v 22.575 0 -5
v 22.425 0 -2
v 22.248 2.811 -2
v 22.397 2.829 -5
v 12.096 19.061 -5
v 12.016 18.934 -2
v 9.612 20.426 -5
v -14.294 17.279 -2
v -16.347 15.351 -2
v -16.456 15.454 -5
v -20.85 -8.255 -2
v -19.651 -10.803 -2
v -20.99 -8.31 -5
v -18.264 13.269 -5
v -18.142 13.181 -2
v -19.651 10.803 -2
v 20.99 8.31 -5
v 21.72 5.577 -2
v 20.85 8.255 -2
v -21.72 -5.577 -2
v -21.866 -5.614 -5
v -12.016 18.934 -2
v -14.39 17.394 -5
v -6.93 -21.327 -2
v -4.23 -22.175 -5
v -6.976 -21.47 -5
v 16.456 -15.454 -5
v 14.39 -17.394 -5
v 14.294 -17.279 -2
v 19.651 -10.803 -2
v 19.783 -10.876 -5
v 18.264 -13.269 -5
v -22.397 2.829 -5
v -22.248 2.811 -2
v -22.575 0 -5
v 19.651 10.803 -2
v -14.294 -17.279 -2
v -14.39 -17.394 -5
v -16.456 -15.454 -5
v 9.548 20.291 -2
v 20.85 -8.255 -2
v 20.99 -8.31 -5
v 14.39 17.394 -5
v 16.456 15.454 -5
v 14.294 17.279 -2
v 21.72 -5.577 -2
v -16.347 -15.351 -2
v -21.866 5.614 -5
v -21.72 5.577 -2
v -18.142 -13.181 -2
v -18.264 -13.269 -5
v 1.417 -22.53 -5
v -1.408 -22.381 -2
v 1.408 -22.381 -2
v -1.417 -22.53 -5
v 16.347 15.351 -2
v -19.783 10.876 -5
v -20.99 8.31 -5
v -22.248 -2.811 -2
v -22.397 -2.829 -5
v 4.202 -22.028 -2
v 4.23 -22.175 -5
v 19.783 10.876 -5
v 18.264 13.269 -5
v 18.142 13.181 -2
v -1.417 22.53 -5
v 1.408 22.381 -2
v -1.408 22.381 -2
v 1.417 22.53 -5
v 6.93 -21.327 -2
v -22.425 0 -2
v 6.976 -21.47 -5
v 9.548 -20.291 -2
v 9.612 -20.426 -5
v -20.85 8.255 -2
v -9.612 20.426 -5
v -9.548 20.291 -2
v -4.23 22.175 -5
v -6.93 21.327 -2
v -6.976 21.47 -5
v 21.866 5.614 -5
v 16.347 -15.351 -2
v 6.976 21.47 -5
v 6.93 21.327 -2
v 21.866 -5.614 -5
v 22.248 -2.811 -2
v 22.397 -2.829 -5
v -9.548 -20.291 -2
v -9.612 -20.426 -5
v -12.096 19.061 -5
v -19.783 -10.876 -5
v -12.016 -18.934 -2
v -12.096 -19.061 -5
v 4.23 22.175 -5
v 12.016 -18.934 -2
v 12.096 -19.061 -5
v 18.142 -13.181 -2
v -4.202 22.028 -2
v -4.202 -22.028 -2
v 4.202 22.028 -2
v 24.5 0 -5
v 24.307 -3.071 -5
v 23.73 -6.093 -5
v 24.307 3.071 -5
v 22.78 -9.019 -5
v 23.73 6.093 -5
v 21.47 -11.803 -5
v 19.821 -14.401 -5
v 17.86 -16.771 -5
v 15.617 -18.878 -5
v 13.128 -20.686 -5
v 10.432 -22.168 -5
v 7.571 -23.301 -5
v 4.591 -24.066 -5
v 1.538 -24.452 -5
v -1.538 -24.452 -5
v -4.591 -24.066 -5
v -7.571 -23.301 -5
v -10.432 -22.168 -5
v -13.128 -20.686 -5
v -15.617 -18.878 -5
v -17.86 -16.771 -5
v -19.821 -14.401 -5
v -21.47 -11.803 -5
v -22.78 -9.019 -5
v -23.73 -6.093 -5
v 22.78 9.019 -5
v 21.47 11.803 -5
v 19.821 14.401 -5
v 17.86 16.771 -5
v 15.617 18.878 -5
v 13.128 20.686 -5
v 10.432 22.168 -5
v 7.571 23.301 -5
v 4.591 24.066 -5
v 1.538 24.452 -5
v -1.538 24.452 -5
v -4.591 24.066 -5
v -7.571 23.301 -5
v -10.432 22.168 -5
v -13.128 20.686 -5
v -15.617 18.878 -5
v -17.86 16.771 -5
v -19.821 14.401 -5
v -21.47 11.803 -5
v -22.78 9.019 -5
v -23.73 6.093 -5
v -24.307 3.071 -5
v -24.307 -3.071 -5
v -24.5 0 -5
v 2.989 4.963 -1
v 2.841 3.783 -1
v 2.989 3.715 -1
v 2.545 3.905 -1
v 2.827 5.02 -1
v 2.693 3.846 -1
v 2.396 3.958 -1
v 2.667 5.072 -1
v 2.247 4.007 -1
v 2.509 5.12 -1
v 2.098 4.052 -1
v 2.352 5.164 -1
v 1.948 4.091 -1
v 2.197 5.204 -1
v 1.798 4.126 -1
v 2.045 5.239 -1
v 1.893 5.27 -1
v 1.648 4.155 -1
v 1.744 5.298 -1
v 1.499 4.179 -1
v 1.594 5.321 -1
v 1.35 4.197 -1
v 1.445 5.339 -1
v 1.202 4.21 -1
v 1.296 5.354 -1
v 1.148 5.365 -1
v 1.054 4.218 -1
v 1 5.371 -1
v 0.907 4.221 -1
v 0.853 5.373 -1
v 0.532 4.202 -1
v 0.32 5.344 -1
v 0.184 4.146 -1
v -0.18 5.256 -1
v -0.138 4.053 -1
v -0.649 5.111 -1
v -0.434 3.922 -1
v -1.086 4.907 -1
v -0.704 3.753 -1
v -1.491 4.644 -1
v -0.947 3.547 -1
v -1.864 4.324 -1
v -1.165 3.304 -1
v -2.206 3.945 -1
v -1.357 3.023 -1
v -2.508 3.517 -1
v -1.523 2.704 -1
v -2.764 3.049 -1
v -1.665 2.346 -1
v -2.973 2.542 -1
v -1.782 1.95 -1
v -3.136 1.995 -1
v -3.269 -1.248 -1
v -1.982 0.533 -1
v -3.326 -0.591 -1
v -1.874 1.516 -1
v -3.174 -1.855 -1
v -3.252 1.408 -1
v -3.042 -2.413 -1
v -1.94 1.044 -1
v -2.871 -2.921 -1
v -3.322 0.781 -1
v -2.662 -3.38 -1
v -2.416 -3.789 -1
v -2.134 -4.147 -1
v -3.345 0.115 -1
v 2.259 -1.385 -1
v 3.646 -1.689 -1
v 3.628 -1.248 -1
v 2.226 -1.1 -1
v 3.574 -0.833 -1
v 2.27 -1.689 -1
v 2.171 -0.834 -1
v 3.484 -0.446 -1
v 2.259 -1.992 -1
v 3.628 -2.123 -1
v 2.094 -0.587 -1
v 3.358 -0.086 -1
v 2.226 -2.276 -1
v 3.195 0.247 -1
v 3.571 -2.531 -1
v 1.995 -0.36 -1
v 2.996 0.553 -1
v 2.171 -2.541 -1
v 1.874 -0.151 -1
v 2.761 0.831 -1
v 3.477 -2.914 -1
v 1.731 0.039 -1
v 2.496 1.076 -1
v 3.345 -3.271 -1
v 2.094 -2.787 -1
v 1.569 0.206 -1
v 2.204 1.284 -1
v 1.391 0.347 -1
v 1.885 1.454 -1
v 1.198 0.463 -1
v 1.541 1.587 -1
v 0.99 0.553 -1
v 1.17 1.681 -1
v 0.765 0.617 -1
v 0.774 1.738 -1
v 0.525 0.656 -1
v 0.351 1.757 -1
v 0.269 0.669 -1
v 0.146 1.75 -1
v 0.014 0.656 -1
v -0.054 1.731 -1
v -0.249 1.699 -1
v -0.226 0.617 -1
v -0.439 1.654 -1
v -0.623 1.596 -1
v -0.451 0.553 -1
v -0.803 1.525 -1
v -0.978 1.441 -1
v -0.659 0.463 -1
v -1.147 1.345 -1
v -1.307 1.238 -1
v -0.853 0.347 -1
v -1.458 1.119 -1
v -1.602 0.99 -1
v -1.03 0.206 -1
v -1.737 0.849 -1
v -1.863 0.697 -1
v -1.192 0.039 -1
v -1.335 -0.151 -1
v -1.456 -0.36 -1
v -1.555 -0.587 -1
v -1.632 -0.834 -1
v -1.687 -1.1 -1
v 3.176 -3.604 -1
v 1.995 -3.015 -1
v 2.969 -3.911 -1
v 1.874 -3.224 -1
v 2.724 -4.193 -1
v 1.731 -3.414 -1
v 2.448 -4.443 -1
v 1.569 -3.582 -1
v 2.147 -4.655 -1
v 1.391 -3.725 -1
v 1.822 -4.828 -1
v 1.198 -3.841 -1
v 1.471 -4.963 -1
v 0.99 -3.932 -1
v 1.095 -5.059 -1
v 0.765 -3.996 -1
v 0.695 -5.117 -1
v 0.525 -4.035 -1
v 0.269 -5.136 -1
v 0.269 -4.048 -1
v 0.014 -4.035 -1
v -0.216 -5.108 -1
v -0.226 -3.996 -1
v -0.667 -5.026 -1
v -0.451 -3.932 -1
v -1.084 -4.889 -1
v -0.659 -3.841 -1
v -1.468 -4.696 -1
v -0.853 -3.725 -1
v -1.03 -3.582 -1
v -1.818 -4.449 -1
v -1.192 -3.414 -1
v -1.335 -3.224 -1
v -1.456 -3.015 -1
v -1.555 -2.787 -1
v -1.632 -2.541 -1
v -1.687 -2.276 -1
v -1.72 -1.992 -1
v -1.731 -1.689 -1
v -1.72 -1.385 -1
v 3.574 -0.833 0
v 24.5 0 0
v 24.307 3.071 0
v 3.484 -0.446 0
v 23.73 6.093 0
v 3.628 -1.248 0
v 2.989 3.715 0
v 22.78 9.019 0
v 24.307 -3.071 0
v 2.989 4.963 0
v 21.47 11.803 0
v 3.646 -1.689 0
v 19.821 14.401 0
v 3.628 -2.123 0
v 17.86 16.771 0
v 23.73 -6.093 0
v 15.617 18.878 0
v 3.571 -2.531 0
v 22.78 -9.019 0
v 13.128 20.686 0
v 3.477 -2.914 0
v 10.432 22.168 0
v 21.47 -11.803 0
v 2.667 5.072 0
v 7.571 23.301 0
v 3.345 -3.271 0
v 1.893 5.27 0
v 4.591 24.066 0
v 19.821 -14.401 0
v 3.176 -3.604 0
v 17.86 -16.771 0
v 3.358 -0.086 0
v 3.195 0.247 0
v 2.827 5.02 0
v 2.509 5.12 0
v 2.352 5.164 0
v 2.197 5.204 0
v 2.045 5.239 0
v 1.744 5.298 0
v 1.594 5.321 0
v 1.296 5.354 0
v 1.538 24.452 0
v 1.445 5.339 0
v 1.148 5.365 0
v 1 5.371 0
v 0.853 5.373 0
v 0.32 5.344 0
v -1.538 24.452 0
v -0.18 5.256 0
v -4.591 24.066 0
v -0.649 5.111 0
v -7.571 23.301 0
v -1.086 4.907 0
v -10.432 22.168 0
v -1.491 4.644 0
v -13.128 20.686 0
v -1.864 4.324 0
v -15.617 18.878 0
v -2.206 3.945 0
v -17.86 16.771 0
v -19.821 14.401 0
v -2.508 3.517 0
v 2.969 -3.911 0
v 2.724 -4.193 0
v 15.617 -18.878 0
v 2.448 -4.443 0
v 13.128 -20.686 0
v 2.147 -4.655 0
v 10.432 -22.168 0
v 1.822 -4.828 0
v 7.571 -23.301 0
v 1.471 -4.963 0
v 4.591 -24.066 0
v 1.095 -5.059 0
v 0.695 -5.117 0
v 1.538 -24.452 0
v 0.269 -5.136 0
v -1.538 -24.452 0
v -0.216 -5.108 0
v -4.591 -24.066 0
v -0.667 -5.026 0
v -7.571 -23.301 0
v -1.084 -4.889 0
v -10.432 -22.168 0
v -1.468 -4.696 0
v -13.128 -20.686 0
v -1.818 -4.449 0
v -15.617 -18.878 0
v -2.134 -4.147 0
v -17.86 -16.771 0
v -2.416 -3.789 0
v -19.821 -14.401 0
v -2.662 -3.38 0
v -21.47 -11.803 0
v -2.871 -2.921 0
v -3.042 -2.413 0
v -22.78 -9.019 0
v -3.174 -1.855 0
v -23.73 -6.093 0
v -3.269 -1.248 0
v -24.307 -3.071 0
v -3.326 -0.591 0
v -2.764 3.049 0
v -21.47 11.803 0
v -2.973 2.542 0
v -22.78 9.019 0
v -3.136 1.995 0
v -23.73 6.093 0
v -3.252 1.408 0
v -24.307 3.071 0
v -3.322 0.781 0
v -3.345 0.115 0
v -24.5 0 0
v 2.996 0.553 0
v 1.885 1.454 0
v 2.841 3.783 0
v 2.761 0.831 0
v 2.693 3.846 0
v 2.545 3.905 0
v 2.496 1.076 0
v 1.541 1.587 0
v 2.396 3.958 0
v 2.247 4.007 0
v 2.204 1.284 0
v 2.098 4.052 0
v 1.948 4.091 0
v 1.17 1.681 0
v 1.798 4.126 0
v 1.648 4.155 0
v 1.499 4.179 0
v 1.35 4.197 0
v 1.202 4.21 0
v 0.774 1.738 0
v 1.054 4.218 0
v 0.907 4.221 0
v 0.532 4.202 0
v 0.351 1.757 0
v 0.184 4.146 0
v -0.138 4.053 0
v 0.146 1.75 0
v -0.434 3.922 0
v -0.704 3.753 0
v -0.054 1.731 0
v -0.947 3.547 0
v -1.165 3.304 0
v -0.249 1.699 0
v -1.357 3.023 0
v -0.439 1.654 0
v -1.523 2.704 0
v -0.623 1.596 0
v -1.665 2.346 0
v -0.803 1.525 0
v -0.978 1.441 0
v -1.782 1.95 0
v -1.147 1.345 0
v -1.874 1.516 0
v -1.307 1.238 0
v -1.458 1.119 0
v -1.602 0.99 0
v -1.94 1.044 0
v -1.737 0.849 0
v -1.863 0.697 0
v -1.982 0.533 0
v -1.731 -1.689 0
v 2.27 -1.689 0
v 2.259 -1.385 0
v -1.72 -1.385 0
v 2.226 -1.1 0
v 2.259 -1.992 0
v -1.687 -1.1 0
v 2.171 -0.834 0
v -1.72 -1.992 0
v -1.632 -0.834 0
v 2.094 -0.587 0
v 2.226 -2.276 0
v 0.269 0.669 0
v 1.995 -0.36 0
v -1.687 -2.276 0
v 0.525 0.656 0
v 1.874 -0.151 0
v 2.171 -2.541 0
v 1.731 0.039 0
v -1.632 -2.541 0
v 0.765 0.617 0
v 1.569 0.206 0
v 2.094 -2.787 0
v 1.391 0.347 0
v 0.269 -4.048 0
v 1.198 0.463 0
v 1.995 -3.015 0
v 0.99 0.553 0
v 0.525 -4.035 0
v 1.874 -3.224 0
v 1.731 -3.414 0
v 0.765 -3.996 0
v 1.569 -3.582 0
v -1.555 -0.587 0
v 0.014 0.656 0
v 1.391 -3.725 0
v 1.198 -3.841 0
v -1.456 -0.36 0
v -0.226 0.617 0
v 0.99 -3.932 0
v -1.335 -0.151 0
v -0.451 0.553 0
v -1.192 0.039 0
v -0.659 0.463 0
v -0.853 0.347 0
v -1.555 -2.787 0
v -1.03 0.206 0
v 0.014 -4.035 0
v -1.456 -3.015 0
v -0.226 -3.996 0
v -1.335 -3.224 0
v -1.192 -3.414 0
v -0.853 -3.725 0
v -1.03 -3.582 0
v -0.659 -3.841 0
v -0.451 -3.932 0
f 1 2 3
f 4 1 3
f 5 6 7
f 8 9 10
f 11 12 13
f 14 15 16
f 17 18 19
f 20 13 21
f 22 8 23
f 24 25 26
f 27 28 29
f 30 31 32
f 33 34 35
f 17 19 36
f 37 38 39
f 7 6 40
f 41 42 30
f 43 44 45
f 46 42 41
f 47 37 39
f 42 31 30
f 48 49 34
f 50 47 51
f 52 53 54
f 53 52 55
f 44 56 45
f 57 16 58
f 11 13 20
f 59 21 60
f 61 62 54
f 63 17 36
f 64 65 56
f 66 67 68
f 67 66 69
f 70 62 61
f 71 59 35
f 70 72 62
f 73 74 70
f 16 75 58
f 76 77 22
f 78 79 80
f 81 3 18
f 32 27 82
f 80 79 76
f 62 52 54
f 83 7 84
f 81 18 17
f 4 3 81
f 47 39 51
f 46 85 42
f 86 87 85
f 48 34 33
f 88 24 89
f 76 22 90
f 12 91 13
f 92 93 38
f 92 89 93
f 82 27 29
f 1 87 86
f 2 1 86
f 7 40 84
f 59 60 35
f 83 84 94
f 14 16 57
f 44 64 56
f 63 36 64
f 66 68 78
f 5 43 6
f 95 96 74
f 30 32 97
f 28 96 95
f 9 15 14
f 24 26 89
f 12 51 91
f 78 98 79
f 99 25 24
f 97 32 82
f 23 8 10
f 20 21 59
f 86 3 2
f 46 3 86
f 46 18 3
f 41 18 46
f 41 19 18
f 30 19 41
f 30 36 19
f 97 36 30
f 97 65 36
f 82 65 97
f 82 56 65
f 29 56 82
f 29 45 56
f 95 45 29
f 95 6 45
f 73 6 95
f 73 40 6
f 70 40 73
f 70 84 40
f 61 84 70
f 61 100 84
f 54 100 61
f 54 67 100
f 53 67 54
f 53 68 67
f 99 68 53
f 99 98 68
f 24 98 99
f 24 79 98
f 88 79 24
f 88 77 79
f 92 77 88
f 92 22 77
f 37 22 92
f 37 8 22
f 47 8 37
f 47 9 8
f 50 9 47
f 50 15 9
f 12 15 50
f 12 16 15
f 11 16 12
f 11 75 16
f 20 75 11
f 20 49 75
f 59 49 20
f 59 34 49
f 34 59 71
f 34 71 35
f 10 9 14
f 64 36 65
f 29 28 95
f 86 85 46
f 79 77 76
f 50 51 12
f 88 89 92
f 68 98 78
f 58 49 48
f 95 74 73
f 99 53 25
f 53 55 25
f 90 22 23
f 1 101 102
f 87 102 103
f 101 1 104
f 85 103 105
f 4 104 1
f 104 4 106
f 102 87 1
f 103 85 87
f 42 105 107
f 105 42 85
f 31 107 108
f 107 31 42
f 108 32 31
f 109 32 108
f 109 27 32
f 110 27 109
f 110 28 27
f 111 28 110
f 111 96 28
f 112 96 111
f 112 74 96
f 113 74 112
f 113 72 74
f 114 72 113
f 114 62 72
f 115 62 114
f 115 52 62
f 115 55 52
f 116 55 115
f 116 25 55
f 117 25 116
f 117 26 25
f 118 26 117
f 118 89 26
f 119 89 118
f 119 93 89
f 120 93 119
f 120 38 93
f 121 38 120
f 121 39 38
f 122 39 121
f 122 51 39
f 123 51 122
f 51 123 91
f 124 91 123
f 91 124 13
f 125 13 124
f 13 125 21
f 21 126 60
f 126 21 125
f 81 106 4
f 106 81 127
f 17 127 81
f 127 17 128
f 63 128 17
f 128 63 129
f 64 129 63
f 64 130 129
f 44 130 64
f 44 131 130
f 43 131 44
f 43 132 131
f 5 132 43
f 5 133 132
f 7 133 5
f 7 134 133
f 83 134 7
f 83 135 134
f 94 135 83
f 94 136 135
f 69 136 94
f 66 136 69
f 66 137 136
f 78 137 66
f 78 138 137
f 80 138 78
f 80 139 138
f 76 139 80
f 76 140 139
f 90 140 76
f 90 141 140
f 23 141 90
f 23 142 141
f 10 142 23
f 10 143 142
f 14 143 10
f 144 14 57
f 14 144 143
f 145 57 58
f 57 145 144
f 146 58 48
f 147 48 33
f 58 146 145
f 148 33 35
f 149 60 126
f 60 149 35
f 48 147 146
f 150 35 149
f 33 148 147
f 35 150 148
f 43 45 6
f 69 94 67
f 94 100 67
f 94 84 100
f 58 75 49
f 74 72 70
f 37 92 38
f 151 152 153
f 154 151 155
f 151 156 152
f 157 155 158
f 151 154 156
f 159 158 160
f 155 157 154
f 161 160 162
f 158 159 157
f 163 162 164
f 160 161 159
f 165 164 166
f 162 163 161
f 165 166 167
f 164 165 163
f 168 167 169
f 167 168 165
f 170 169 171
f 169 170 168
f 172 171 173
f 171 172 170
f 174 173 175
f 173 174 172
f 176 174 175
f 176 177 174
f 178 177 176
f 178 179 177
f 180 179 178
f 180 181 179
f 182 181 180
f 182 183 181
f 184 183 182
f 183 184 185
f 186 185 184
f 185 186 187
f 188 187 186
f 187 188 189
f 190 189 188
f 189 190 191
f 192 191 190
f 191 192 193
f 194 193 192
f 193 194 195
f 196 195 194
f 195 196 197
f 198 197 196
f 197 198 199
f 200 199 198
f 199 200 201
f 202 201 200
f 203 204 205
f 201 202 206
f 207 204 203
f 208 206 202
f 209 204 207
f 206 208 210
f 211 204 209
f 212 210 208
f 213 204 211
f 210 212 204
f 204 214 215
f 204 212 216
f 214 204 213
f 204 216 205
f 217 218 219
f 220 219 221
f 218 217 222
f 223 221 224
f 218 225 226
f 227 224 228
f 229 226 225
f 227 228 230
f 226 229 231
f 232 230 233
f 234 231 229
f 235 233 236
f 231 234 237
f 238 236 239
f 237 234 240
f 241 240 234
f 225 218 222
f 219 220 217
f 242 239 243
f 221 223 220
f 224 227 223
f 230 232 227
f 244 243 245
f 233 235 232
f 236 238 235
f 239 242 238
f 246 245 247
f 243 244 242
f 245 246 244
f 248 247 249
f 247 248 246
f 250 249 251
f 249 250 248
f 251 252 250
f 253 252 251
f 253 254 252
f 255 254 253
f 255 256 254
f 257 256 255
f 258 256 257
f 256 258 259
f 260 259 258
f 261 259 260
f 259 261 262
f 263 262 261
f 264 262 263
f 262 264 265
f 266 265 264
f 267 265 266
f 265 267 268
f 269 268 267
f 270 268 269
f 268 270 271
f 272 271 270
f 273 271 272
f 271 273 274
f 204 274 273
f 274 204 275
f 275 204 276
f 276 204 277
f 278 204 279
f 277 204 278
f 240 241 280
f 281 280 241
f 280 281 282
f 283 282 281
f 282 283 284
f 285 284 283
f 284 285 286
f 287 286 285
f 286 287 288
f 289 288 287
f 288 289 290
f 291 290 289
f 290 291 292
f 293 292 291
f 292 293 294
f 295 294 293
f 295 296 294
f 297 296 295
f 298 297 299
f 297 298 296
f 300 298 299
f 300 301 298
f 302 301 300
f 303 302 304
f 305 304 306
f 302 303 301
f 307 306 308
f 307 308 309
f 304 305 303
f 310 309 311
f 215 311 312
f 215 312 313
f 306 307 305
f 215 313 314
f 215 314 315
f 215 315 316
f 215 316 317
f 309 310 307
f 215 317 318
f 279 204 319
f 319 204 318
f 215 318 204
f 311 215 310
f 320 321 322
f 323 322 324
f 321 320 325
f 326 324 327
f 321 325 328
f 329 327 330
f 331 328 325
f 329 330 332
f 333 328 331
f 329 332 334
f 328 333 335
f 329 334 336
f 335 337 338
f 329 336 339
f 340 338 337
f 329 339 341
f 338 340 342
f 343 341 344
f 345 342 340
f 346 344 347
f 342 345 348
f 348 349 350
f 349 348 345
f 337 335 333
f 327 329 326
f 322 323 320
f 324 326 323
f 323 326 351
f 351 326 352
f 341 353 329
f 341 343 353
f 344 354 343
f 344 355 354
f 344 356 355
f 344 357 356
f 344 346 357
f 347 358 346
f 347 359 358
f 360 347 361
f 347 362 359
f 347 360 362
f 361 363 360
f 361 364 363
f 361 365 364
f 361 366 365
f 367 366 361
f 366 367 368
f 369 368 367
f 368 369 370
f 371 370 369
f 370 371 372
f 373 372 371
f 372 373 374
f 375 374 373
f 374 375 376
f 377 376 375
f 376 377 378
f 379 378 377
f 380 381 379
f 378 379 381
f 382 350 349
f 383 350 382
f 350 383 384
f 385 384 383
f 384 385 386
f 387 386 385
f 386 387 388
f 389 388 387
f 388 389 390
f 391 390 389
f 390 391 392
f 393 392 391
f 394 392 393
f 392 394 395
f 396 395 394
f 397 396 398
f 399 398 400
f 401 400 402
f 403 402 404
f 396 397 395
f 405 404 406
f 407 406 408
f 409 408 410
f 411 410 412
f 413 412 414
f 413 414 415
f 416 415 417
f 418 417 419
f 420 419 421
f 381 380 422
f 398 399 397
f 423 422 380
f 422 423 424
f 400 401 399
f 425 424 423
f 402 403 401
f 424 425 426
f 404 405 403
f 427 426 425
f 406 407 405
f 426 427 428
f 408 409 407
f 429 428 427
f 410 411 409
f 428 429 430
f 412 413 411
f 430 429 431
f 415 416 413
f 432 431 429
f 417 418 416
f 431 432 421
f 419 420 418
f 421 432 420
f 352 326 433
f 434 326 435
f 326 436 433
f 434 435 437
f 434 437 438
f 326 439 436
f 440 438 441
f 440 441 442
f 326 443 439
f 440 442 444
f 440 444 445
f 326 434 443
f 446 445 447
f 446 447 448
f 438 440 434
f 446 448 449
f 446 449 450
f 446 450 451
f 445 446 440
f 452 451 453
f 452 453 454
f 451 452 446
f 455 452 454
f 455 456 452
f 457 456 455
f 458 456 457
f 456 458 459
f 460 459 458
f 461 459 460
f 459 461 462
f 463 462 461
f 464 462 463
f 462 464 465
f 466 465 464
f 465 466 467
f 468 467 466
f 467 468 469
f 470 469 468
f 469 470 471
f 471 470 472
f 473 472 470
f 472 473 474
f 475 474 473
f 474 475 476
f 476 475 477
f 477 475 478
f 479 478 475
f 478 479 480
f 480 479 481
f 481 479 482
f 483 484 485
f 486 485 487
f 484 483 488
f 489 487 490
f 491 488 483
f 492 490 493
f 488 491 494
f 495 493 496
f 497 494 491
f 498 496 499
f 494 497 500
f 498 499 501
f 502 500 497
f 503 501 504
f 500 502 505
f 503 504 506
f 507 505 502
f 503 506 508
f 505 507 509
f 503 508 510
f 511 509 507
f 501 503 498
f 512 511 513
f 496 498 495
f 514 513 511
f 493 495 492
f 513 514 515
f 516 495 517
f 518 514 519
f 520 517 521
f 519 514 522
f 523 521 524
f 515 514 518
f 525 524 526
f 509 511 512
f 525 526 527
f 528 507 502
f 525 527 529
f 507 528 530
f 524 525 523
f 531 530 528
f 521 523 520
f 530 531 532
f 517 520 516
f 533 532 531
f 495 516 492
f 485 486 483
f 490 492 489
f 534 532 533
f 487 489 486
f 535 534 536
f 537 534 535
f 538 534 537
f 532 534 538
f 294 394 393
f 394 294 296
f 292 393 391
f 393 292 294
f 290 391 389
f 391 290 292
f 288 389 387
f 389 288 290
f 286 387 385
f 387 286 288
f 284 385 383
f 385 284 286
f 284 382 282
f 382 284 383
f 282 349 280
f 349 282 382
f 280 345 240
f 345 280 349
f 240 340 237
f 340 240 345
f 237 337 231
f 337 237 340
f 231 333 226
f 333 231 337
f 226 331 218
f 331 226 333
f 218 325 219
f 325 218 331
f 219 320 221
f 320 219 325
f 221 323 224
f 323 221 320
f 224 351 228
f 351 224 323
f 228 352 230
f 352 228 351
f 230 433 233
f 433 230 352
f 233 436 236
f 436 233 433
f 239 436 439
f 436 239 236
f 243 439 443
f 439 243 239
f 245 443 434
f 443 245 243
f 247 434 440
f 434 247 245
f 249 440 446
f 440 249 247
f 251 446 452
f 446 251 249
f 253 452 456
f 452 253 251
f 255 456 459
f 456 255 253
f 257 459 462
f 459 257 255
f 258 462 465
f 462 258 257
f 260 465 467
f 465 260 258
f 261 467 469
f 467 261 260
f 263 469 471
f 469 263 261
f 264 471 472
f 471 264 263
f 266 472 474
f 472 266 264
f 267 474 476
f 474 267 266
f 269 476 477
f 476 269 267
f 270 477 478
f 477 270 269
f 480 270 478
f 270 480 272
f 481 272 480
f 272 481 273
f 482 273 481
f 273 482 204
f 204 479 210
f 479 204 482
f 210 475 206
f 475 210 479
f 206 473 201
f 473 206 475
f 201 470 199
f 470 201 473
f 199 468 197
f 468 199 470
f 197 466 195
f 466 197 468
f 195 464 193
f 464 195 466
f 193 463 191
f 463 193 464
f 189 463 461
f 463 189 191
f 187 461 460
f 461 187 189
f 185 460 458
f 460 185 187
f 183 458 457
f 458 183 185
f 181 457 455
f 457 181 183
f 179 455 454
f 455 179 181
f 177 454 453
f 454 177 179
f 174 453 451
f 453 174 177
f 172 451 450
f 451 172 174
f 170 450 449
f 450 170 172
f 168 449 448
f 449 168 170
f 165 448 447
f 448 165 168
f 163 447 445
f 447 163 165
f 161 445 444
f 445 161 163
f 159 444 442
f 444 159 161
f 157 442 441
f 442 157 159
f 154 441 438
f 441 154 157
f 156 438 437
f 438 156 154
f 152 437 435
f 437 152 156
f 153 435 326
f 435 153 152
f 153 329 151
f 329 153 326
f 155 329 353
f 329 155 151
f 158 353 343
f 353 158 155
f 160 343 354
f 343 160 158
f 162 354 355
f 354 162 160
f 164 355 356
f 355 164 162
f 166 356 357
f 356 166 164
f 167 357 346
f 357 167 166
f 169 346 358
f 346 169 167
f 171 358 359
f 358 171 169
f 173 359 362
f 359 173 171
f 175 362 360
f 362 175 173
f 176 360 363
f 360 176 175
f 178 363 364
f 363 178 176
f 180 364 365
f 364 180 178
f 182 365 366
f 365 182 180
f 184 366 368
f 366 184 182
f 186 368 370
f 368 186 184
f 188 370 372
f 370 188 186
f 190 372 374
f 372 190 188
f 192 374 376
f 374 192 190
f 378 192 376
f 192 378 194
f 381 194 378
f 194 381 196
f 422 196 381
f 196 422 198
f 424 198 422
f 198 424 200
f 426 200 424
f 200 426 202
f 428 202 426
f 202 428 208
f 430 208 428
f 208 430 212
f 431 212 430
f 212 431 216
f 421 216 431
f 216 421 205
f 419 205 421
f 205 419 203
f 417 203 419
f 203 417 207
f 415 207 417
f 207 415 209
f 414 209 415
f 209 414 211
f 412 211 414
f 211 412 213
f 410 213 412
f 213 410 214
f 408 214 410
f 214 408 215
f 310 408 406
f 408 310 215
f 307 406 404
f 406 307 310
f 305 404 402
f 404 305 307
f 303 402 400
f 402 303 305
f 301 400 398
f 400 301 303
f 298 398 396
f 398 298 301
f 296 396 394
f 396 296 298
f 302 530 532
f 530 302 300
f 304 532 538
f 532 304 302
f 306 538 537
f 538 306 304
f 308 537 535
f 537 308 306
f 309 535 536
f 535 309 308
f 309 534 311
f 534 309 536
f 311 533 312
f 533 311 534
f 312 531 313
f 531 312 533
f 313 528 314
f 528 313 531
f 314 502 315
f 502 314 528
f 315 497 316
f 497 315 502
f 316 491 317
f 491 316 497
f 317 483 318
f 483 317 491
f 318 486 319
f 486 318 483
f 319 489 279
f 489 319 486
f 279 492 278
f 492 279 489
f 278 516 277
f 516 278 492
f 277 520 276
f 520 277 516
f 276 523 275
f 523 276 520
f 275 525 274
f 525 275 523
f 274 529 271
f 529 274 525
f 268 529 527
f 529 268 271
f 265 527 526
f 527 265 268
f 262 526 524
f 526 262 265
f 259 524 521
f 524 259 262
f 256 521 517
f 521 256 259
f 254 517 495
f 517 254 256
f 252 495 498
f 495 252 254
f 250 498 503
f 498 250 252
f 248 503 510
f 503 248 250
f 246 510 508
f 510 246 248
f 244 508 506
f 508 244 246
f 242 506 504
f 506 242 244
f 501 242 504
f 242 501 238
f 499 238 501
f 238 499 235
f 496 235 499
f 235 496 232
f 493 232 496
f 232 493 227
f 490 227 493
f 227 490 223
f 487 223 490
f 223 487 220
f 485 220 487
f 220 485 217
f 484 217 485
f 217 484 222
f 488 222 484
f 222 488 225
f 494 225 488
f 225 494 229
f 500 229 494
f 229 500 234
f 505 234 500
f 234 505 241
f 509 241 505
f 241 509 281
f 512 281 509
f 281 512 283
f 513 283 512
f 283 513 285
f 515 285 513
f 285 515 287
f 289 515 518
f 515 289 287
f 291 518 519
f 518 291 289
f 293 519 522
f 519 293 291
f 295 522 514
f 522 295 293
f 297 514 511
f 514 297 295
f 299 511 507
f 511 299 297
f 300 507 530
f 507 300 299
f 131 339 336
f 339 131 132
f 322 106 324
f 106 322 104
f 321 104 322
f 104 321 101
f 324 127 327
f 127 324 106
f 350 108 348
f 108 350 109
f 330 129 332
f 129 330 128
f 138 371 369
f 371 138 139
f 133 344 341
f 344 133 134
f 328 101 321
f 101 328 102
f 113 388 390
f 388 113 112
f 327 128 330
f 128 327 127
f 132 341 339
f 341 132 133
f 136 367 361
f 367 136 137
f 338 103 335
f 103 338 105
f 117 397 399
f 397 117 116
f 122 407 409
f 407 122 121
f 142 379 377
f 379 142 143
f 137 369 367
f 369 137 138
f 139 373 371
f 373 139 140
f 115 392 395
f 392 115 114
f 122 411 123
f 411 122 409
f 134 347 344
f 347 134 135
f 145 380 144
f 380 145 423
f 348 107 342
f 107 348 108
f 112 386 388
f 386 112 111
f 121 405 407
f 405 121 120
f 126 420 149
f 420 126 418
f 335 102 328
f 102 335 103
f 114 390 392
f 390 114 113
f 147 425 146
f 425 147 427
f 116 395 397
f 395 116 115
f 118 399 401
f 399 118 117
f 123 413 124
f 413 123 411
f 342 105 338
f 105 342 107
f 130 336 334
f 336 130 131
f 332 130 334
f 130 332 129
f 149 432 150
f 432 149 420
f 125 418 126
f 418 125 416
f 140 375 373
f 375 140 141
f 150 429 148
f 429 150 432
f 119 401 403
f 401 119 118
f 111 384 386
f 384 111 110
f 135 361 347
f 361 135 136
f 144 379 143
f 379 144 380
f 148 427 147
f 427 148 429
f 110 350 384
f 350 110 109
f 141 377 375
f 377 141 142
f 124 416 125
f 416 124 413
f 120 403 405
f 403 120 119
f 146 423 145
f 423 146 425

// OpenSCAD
$fn = 50;

difference() {
	union() {
		translate(v = [0, 0, -5.0]) {
			cylinder(h = 5, r = 24.5);
		}
	}
	union() {
		#translate(v = [0, 0, -5.0]) {
			cylinder(h = 3, r1 = 22.575, r2 = 22.425);
		}
		translate(v = [0, 0, -1]) {
			linear_extrude(height = 1) {
				text(font = "Impact", halign = "center", size = 10, text = "6", valign = "center");
			}
		}
	}
}
